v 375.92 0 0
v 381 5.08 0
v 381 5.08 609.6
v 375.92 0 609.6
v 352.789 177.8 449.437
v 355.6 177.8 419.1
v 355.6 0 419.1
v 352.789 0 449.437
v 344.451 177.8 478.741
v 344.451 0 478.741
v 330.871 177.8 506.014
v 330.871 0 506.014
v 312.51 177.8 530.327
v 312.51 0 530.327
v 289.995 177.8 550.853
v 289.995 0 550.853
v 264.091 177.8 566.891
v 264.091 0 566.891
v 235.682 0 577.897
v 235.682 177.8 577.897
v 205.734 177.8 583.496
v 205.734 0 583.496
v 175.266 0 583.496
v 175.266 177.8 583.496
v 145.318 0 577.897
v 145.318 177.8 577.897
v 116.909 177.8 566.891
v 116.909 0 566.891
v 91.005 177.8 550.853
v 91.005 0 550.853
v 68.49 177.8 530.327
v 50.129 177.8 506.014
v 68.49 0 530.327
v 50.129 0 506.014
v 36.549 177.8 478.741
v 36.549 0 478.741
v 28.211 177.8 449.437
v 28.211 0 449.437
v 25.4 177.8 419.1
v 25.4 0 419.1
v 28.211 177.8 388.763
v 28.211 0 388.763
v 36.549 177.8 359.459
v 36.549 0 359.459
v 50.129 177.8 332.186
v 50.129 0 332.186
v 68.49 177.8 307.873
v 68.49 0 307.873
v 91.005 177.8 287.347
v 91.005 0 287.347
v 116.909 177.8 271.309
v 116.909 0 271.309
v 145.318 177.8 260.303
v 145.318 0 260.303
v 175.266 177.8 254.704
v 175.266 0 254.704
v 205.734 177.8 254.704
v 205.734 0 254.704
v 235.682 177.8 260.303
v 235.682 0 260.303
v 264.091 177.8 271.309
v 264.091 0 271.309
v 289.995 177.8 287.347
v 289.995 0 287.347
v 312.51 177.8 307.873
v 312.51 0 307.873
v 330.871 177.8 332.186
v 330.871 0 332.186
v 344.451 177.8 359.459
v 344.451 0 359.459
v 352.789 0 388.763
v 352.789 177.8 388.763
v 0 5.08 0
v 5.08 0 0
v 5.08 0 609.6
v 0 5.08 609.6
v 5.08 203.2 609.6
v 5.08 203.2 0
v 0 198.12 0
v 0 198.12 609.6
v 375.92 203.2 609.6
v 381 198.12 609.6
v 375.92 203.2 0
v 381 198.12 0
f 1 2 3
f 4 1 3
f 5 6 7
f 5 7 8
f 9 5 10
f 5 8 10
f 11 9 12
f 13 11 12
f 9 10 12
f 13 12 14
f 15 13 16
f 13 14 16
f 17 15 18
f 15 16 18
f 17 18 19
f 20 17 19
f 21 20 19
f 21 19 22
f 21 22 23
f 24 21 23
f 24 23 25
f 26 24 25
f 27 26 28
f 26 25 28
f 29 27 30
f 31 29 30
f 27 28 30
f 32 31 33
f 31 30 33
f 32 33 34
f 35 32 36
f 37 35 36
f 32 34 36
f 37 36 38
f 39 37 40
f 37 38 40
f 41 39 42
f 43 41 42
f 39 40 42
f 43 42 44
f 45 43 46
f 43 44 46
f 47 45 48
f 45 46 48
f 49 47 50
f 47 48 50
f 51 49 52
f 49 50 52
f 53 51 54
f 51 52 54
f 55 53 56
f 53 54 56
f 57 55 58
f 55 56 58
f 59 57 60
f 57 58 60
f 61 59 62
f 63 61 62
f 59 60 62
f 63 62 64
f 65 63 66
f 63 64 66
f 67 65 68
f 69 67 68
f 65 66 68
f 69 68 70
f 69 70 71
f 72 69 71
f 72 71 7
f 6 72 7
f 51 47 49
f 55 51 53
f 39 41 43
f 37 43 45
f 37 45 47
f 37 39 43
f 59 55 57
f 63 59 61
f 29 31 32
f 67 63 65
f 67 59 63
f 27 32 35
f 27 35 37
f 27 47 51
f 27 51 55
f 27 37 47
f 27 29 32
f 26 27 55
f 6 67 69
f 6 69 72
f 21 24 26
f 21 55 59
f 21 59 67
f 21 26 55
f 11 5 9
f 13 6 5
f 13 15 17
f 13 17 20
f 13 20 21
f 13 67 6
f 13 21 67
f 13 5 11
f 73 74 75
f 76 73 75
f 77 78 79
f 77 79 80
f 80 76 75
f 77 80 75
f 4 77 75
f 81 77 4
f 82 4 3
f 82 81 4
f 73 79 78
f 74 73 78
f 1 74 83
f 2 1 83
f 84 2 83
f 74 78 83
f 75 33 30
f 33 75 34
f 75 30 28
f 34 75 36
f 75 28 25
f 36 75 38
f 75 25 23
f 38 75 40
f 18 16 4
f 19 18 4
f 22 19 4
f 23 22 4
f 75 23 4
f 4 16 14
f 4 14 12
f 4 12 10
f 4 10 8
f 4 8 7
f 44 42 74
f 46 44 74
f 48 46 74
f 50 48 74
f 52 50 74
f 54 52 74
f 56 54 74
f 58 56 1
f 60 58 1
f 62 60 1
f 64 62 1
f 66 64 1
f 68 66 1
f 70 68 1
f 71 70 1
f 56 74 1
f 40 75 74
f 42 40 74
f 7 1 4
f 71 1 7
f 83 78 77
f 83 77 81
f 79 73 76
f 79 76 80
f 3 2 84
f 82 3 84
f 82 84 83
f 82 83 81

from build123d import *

# Parameters (mm, degrees)
F0_W     = 381
F0_H     = 203.2
F1_DEPTH = 609.6
F2_R     = 165.1
F3_DEPTH = 177.8
F4_SIZE  = 5.08


with BuildPart() as f1:
    # F0 (on Top) → F1 (new body)
    with BuildSketch(Plane.XY):
        with Locations((190.5, 101.6)):
            Rectangle(F0_W, F0_H)
    extrude(amount=F1_DEPTH)

    # F2 (on face) → F3 (cut)
    with BuildSketch(Plane.XZ):
        with Locations((190.5, 419.1)):
            Circle(F2_R)
    extrude(amount=-F3_DEPTH, mode=Mode.SUBTRACT)

    # F4
    f4_edges = [f1.edges().sort_by_distance(p)[0] for p in [
        (0, 203.2, 304.8),
        (0, 0, 304.8),
        (381, 0, 304.8),
        (381, 203.2, 304.8),
    ]]
    chamfer(f4_edges, length=F4_SIZE)


solid = f1.part
